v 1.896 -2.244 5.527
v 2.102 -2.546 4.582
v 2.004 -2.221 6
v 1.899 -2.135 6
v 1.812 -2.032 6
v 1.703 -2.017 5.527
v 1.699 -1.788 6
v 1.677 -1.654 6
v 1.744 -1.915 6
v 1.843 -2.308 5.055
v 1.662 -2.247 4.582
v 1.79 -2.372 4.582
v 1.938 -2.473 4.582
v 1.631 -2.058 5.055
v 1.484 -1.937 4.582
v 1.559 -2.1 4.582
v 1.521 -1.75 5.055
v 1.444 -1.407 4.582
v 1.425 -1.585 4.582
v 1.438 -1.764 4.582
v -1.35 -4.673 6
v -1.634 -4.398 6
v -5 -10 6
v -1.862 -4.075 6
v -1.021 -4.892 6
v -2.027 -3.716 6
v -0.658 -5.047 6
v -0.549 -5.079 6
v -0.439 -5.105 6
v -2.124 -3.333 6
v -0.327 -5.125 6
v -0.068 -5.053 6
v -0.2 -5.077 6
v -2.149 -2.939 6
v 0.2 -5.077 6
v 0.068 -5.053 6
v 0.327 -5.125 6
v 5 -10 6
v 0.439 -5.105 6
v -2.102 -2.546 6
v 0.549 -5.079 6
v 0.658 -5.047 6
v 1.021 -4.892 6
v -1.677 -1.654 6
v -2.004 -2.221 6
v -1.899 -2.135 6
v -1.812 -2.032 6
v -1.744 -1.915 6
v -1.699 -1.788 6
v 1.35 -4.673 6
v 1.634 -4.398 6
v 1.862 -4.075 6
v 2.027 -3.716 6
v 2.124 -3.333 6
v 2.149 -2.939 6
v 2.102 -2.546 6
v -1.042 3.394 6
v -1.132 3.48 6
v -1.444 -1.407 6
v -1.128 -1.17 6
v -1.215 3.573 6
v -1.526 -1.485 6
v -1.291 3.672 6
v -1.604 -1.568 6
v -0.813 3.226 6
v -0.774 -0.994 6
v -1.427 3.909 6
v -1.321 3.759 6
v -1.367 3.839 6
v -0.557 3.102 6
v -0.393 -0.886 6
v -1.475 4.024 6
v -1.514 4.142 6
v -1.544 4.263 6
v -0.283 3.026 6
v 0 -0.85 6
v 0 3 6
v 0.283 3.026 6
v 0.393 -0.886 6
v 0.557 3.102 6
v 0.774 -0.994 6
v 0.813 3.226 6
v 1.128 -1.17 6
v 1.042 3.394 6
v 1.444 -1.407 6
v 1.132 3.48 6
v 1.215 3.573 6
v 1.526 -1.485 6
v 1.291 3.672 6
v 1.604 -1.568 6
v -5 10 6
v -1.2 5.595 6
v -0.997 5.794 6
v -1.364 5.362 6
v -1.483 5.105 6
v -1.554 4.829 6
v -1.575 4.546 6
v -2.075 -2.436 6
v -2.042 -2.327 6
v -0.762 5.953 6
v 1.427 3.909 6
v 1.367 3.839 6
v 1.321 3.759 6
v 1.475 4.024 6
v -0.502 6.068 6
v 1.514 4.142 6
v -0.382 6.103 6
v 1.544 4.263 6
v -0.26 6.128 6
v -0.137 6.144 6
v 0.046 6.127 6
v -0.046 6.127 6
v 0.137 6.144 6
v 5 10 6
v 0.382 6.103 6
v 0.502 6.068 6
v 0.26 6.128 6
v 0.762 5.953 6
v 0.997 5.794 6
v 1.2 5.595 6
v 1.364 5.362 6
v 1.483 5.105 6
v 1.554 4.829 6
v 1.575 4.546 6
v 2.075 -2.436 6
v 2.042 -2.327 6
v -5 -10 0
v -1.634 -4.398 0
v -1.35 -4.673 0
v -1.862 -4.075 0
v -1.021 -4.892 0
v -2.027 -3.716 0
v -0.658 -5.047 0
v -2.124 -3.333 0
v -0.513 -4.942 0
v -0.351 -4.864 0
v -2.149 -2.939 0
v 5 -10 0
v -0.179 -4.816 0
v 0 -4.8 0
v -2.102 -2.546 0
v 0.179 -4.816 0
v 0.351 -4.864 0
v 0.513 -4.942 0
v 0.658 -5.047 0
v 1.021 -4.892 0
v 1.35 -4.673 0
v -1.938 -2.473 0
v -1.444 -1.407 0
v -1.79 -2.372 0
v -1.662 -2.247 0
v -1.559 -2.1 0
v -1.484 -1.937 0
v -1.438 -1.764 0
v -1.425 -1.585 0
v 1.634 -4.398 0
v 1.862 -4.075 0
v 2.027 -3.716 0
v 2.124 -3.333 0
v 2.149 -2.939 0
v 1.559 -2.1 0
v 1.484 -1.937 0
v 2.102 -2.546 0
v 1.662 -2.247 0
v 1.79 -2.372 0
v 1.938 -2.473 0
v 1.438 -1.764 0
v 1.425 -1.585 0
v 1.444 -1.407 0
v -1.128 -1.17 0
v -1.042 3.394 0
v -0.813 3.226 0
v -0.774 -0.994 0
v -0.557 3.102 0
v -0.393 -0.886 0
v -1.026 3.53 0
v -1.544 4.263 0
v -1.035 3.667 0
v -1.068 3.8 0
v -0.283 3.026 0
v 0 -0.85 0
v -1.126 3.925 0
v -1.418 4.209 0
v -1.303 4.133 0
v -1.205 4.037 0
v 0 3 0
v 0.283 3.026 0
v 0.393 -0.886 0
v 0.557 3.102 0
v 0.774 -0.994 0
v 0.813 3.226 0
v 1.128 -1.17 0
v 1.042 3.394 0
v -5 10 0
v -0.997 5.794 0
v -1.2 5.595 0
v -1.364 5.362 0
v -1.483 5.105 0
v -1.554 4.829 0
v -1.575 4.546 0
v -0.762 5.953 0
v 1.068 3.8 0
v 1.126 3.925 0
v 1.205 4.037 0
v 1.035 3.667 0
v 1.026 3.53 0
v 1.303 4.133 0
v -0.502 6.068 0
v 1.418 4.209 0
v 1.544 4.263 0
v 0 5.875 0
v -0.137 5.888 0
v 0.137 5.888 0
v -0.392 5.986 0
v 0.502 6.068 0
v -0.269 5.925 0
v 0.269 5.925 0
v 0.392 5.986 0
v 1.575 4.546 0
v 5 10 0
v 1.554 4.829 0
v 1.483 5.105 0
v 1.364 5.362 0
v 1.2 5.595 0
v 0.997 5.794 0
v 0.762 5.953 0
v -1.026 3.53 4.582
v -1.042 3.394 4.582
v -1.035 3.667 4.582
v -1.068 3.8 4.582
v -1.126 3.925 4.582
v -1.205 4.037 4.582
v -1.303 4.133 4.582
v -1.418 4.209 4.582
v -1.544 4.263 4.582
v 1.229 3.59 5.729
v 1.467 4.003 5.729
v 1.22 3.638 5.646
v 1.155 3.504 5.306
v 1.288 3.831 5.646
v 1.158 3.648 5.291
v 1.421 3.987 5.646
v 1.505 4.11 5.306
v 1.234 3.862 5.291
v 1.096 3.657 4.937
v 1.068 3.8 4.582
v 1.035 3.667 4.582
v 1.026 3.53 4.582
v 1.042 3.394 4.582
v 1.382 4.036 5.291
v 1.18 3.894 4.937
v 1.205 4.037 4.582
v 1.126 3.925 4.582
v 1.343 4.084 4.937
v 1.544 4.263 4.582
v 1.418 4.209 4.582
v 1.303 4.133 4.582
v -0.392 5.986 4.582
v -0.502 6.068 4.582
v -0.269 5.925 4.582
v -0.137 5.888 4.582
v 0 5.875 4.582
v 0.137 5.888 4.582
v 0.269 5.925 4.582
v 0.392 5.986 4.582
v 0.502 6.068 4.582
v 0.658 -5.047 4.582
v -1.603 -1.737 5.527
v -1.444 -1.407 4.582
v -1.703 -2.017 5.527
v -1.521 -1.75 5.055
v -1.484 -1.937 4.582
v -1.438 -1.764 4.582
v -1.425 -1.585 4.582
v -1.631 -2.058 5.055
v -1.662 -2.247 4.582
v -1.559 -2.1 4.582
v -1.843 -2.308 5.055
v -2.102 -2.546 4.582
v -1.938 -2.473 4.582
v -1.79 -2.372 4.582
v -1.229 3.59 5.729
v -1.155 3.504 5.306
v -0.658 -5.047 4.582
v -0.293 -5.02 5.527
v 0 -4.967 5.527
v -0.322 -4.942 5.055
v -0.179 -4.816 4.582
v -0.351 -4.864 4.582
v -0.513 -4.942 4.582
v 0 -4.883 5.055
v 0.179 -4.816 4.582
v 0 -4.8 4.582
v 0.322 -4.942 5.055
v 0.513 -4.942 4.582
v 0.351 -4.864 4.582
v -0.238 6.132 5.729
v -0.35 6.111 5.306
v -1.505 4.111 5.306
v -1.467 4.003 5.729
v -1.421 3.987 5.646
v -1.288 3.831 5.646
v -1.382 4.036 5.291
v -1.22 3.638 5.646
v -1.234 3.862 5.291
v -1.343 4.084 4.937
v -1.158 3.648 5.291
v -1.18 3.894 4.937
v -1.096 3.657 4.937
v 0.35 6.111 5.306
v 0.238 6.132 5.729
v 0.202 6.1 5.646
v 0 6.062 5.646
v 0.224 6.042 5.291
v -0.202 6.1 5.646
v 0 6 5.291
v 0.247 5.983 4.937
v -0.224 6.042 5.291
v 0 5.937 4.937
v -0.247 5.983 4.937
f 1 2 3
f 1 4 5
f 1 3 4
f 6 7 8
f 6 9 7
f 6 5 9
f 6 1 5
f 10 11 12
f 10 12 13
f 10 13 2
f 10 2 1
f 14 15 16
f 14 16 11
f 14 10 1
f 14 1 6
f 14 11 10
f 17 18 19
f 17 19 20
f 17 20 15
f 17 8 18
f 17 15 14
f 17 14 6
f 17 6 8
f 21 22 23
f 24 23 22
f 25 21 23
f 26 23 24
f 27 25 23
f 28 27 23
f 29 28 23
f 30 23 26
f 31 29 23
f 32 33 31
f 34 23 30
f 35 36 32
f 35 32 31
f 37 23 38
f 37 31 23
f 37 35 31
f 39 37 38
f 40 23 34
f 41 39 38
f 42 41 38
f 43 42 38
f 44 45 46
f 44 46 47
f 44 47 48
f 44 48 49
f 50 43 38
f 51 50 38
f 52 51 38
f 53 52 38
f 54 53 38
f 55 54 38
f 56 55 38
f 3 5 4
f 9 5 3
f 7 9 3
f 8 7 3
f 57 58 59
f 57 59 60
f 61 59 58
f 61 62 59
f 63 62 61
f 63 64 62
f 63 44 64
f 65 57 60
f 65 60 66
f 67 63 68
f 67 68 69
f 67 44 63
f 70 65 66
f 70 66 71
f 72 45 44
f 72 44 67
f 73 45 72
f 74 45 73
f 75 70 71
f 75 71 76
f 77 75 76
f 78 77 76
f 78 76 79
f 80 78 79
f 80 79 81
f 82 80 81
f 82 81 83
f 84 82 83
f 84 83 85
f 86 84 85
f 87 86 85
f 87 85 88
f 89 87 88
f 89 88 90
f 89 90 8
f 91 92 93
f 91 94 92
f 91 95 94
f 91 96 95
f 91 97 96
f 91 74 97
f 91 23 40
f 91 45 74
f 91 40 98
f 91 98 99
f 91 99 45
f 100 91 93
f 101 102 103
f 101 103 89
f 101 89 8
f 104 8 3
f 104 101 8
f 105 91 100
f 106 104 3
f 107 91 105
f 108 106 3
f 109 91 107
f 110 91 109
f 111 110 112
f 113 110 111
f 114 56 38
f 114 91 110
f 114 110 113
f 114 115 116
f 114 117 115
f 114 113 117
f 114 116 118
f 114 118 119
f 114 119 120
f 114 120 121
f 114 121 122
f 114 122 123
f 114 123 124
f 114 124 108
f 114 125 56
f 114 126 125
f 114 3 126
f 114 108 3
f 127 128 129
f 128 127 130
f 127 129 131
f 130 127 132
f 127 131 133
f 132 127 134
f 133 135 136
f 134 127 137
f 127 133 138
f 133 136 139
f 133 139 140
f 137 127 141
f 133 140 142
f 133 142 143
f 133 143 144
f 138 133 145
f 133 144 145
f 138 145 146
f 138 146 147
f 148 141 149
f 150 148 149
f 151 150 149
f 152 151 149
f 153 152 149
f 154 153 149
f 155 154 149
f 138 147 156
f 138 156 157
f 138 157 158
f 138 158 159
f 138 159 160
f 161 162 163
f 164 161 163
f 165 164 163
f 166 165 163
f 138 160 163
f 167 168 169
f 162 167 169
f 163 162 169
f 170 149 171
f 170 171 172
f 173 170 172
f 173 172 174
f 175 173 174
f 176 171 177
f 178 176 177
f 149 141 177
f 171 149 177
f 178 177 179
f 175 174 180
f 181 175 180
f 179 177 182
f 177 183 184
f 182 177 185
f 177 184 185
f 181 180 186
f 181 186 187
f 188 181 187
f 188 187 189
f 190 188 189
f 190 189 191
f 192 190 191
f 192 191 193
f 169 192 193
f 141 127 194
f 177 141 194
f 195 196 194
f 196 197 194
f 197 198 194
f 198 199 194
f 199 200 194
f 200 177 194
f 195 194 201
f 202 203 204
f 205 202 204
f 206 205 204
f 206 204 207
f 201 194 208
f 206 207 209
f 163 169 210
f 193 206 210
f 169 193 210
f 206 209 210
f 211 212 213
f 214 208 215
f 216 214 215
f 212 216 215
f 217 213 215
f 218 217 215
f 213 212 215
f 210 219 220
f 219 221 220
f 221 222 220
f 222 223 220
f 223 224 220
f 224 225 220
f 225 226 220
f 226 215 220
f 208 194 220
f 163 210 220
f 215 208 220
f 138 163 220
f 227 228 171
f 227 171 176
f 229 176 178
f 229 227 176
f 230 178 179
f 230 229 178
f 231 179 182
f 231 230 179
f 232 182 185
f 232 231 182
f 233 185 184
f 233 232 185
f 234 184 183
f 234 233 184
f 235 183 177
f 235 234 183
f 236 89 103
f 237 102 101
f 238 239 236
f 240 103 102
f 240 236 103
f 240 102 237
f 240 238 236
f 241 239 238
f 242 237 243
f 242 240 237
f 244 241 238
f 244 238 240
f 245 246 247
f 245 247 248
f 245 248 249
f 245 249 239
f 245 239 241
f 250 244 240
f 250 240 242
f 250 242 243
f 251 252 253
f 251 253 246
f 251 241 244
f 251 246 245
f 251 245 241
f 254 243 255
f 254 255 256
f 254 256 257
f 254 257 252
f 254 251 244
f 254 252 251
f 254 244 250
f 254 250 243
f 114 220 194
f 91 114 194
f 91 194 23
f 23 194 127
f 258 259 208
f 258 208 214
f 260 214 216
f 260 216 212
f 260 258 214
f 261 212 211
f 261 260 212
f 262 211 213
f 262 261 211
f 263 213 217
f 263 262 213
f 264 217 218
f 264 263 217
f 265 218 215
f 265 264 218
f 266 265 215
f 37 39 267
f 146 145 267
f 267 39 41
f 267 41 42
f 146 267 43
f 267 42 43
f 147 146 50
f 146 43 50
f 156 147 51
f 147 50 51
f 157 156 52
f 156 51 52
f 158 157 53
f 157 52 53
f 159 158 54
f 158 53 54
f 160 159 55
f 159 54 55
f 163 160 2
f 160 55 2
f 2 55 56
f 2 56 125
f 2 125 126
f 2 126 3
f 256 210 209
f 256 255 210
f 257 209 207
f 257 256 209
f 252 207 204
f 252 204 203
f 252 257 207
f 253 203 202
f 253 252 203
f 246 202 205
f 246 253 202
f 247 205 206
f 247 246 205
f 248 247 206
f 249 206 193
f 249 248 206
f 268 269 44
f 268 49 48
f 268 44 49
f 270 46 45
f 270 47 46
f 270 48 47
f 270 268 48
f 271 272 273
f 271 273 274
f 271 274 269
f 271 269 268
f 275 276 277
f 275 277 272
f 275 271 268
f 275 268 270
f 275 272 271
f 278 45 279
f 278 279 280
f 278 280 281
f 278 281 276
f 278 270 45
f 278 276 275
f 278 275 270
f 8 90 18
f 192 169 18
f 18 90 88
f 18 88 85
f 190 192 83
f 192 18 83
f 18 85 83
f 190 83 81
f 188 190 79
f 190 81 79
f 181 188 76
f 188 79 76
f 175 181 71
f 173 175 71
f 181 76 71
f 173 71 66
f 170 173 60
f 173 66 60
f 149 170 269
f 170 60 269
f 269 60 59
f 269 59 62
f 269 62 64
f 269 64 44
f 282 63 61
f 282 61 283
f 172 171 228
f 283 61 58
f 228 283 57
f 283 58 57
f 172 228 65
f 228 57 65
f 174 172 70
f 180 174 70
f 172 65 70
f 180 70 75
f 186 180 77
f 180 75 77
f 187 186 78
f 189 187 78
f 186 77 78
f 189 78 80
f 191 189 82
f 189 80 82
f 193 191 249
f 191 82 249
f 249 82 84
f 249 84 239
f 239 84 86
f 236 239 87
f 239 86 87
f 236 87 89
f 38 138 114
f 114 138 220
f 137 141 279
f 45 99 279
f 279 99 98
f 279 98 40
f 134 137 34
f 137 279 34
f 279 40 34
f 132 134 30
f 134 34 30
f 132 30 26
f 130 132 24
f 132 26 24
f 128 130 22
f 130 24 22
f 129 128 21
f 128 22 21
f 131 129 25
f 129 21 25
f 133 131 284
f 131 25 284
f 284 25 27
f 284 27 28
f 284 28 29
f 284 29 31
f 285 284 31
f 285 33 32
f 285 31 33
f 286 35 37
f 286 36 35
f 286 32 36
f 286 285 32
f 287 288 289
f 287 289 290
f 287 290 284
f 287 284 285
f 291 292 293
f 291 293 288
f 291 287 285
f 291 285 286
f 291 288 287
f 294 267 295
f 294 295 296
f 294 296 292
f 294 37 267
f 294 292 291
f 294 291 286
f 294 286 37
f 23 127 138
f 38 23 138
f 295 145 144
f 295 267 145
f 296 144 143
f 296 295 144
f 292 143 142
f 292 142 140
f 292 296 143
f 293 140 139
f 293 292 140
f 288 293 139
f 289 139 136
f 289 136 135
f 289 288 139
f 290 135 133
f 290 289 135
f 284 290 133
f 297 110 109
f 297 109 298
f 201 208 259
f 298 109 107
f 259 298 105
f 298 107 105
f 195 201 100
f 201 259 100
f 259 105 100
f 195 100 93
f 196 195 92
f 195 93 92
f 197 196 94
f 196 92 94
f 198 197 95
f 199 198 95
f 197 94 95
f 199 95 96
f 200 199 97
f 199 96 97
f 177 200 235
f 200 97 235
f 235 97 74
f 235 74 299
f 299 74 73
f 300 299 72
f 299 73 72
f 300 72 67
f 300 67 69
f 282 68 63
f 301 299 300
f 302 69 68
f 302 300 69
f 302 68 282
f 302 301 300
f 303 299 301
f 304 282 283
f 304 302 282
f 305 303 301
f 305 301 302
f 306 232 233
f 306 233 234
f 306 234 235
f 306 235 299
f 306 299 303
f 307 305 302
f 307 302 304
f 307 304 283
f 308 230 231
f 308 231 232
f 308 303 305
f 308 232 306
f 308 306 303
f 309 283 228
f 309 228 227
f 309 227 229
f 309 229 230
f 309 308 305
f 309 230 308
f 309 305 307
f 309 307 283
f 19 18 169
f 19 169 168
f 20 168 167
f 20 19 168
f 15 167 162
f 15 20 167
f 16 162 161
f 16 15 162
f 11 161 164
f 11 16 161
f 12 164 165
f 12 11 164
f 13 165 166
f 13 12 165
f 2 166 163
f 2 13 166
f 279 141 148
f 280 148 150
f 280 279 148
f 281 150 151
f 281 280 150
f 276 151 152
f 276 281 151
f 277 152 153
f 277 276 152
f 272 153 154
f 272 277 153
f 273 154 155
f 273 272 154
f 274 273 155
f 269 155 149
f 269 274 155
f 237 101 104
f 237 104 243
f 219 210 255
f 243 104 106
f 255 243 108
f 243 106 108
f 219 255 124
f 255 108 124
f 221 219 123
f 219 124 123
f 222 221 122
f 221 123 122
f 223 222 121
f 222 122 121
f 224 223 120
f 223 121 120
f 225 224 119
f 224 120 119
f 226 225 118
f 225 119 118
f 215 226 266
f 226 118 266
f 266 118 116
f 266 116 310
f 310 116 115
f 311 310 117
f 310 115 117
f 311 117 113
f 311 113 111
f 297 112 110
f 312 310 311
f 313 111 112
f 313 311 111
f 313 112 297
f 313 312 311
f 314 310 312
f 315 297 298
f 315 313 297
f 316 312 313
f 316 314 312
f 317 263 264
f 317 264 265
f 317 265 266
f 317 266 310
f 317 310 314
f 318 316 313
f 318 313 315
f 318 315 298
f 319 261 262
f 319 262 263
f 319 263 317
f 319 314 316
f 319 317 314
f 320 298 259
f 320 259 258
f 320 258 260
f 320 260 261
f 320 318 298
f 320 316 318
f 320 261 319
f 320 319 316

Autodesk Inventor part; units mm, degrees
ref_plane "YZ Plane" through (0, 0, 0) normal (1, 0, 0) x (0, 1, 0)
ref_plane "XZ Plane" through (0, 0, 0) normal (0, 1, 0) x (-1, 0, 0)
ref_plane "XY Plane" through (0, 0, 0) normal (0, 0, 1) x (1, 0, 0)
sketch "Sketch1" plane through (0, 0, 0) normal (0, 0, 1) x (1, 0, 0)
  line L0 (-5, -10) -> (5, -10)
  line L1 (5, -10) -> (5, 10)
  line L2 (5, 10) -> (-5, 10)
  line L3 (-5, 10) -> (-5, -10)
  line L4 (-5, -10) -> (5, 10) construction
  line L5 (5, -10) -> (-5, 10) construction
  circle A0 centre (-10.5904, 5.4479) radius 1.6
  circle A1 centre (-8.5404, 5.4479) radius 0.75
  point P0 (0, 0)
  point P1 (-9.0782, 4.9252)
  point P2 (-9.0782, 5.9707)
  dimension "d0" = 3.2
  dimension "d1" = 2.05
  dimension "d2" = 1.5
  dimension "d29" = 10
  dimension "d30" = 20
extrude "Extrusion1" add sketch "Sketch1" along normal blind 6 contours L3 L2 L1 L0
sketch "Sketch2" plane through (0, 0, 6) normal (0, 0, 1) x (1, 0, 0)
  circle A0 centre (0, 4.575) radius 1.575
  line L0 (0, 4.575) -> (0, 6.625)
  circle A1 centre (0, 6.625) radius 0.75
  circle A2 centre (-1.7754, 3.55) radius 0.75
  circle A3 centre (1.7754, 3.55) radius 0.75
  line L1 (0, 0) -> (0, 3)
  circle A4 centre (0, -3) radius 2.15
  line L2 (0, -3) -> (0, -5.8)
  circle A5 centre (0, -5.8) radius 1
  circle A6 centre (2.4249, -1.6) radius 1
  circle A7 centre (-2.4249, -1.6) radius 1
  point P0 (1.0418, 3.3938)
  point P1 (1.5439, 4.2634)
  point P2 (0.5021, 6.0678)
  point P3 (-0.5021, 6.0678)
  point P4 (-1.5439, 4.2634)
  point P5 (-1.0418, 3.3938)
  point P6 (-1.4437, -1.4068)
  point P7 (-2.1016, -2.5463)
  point P8 (-0.6579, -5.0469)
  point P9 (0.6579, -5.0469)
  point P10 (2.1016, -2.5463)
  point P11 (1.4437, -1.4068)
  dimension "d5" = 3.15
  dimension "d6" = 2.05
  dimension "d7" = 1.5
  dimension "d10" = 360
  dimension "d17" = 3
  dimension "d18" = 4.3
  dimension "d19" = 2.8
  dimension "d20" = 2
  dimension "d21" = 3
  dimension "d24" = 360
extrude "Extrusion2" cut sketch "Sketch2" against normal blind 10 contours A0 A3 A2 A1 | A4 A5 A7 A6
chamfer "Chamfer1" distance 0.25 angle 80 3 edges at (0, 5.875, 6) (-1.1258, 3.925, 6) (1.1258, 3.925, 6) measured on face at (-4.0339, -0.8488, 6)
chamfer "Chamfer2" distance 0.25 angle 80 3 edges at (-1.5588, -2.1, 6) (1.5588, -2.1, 6) (0, -4.8, 6) measured on face at (-4.0339, -0.8488, 6)
properties part number "Tolerance_test"
